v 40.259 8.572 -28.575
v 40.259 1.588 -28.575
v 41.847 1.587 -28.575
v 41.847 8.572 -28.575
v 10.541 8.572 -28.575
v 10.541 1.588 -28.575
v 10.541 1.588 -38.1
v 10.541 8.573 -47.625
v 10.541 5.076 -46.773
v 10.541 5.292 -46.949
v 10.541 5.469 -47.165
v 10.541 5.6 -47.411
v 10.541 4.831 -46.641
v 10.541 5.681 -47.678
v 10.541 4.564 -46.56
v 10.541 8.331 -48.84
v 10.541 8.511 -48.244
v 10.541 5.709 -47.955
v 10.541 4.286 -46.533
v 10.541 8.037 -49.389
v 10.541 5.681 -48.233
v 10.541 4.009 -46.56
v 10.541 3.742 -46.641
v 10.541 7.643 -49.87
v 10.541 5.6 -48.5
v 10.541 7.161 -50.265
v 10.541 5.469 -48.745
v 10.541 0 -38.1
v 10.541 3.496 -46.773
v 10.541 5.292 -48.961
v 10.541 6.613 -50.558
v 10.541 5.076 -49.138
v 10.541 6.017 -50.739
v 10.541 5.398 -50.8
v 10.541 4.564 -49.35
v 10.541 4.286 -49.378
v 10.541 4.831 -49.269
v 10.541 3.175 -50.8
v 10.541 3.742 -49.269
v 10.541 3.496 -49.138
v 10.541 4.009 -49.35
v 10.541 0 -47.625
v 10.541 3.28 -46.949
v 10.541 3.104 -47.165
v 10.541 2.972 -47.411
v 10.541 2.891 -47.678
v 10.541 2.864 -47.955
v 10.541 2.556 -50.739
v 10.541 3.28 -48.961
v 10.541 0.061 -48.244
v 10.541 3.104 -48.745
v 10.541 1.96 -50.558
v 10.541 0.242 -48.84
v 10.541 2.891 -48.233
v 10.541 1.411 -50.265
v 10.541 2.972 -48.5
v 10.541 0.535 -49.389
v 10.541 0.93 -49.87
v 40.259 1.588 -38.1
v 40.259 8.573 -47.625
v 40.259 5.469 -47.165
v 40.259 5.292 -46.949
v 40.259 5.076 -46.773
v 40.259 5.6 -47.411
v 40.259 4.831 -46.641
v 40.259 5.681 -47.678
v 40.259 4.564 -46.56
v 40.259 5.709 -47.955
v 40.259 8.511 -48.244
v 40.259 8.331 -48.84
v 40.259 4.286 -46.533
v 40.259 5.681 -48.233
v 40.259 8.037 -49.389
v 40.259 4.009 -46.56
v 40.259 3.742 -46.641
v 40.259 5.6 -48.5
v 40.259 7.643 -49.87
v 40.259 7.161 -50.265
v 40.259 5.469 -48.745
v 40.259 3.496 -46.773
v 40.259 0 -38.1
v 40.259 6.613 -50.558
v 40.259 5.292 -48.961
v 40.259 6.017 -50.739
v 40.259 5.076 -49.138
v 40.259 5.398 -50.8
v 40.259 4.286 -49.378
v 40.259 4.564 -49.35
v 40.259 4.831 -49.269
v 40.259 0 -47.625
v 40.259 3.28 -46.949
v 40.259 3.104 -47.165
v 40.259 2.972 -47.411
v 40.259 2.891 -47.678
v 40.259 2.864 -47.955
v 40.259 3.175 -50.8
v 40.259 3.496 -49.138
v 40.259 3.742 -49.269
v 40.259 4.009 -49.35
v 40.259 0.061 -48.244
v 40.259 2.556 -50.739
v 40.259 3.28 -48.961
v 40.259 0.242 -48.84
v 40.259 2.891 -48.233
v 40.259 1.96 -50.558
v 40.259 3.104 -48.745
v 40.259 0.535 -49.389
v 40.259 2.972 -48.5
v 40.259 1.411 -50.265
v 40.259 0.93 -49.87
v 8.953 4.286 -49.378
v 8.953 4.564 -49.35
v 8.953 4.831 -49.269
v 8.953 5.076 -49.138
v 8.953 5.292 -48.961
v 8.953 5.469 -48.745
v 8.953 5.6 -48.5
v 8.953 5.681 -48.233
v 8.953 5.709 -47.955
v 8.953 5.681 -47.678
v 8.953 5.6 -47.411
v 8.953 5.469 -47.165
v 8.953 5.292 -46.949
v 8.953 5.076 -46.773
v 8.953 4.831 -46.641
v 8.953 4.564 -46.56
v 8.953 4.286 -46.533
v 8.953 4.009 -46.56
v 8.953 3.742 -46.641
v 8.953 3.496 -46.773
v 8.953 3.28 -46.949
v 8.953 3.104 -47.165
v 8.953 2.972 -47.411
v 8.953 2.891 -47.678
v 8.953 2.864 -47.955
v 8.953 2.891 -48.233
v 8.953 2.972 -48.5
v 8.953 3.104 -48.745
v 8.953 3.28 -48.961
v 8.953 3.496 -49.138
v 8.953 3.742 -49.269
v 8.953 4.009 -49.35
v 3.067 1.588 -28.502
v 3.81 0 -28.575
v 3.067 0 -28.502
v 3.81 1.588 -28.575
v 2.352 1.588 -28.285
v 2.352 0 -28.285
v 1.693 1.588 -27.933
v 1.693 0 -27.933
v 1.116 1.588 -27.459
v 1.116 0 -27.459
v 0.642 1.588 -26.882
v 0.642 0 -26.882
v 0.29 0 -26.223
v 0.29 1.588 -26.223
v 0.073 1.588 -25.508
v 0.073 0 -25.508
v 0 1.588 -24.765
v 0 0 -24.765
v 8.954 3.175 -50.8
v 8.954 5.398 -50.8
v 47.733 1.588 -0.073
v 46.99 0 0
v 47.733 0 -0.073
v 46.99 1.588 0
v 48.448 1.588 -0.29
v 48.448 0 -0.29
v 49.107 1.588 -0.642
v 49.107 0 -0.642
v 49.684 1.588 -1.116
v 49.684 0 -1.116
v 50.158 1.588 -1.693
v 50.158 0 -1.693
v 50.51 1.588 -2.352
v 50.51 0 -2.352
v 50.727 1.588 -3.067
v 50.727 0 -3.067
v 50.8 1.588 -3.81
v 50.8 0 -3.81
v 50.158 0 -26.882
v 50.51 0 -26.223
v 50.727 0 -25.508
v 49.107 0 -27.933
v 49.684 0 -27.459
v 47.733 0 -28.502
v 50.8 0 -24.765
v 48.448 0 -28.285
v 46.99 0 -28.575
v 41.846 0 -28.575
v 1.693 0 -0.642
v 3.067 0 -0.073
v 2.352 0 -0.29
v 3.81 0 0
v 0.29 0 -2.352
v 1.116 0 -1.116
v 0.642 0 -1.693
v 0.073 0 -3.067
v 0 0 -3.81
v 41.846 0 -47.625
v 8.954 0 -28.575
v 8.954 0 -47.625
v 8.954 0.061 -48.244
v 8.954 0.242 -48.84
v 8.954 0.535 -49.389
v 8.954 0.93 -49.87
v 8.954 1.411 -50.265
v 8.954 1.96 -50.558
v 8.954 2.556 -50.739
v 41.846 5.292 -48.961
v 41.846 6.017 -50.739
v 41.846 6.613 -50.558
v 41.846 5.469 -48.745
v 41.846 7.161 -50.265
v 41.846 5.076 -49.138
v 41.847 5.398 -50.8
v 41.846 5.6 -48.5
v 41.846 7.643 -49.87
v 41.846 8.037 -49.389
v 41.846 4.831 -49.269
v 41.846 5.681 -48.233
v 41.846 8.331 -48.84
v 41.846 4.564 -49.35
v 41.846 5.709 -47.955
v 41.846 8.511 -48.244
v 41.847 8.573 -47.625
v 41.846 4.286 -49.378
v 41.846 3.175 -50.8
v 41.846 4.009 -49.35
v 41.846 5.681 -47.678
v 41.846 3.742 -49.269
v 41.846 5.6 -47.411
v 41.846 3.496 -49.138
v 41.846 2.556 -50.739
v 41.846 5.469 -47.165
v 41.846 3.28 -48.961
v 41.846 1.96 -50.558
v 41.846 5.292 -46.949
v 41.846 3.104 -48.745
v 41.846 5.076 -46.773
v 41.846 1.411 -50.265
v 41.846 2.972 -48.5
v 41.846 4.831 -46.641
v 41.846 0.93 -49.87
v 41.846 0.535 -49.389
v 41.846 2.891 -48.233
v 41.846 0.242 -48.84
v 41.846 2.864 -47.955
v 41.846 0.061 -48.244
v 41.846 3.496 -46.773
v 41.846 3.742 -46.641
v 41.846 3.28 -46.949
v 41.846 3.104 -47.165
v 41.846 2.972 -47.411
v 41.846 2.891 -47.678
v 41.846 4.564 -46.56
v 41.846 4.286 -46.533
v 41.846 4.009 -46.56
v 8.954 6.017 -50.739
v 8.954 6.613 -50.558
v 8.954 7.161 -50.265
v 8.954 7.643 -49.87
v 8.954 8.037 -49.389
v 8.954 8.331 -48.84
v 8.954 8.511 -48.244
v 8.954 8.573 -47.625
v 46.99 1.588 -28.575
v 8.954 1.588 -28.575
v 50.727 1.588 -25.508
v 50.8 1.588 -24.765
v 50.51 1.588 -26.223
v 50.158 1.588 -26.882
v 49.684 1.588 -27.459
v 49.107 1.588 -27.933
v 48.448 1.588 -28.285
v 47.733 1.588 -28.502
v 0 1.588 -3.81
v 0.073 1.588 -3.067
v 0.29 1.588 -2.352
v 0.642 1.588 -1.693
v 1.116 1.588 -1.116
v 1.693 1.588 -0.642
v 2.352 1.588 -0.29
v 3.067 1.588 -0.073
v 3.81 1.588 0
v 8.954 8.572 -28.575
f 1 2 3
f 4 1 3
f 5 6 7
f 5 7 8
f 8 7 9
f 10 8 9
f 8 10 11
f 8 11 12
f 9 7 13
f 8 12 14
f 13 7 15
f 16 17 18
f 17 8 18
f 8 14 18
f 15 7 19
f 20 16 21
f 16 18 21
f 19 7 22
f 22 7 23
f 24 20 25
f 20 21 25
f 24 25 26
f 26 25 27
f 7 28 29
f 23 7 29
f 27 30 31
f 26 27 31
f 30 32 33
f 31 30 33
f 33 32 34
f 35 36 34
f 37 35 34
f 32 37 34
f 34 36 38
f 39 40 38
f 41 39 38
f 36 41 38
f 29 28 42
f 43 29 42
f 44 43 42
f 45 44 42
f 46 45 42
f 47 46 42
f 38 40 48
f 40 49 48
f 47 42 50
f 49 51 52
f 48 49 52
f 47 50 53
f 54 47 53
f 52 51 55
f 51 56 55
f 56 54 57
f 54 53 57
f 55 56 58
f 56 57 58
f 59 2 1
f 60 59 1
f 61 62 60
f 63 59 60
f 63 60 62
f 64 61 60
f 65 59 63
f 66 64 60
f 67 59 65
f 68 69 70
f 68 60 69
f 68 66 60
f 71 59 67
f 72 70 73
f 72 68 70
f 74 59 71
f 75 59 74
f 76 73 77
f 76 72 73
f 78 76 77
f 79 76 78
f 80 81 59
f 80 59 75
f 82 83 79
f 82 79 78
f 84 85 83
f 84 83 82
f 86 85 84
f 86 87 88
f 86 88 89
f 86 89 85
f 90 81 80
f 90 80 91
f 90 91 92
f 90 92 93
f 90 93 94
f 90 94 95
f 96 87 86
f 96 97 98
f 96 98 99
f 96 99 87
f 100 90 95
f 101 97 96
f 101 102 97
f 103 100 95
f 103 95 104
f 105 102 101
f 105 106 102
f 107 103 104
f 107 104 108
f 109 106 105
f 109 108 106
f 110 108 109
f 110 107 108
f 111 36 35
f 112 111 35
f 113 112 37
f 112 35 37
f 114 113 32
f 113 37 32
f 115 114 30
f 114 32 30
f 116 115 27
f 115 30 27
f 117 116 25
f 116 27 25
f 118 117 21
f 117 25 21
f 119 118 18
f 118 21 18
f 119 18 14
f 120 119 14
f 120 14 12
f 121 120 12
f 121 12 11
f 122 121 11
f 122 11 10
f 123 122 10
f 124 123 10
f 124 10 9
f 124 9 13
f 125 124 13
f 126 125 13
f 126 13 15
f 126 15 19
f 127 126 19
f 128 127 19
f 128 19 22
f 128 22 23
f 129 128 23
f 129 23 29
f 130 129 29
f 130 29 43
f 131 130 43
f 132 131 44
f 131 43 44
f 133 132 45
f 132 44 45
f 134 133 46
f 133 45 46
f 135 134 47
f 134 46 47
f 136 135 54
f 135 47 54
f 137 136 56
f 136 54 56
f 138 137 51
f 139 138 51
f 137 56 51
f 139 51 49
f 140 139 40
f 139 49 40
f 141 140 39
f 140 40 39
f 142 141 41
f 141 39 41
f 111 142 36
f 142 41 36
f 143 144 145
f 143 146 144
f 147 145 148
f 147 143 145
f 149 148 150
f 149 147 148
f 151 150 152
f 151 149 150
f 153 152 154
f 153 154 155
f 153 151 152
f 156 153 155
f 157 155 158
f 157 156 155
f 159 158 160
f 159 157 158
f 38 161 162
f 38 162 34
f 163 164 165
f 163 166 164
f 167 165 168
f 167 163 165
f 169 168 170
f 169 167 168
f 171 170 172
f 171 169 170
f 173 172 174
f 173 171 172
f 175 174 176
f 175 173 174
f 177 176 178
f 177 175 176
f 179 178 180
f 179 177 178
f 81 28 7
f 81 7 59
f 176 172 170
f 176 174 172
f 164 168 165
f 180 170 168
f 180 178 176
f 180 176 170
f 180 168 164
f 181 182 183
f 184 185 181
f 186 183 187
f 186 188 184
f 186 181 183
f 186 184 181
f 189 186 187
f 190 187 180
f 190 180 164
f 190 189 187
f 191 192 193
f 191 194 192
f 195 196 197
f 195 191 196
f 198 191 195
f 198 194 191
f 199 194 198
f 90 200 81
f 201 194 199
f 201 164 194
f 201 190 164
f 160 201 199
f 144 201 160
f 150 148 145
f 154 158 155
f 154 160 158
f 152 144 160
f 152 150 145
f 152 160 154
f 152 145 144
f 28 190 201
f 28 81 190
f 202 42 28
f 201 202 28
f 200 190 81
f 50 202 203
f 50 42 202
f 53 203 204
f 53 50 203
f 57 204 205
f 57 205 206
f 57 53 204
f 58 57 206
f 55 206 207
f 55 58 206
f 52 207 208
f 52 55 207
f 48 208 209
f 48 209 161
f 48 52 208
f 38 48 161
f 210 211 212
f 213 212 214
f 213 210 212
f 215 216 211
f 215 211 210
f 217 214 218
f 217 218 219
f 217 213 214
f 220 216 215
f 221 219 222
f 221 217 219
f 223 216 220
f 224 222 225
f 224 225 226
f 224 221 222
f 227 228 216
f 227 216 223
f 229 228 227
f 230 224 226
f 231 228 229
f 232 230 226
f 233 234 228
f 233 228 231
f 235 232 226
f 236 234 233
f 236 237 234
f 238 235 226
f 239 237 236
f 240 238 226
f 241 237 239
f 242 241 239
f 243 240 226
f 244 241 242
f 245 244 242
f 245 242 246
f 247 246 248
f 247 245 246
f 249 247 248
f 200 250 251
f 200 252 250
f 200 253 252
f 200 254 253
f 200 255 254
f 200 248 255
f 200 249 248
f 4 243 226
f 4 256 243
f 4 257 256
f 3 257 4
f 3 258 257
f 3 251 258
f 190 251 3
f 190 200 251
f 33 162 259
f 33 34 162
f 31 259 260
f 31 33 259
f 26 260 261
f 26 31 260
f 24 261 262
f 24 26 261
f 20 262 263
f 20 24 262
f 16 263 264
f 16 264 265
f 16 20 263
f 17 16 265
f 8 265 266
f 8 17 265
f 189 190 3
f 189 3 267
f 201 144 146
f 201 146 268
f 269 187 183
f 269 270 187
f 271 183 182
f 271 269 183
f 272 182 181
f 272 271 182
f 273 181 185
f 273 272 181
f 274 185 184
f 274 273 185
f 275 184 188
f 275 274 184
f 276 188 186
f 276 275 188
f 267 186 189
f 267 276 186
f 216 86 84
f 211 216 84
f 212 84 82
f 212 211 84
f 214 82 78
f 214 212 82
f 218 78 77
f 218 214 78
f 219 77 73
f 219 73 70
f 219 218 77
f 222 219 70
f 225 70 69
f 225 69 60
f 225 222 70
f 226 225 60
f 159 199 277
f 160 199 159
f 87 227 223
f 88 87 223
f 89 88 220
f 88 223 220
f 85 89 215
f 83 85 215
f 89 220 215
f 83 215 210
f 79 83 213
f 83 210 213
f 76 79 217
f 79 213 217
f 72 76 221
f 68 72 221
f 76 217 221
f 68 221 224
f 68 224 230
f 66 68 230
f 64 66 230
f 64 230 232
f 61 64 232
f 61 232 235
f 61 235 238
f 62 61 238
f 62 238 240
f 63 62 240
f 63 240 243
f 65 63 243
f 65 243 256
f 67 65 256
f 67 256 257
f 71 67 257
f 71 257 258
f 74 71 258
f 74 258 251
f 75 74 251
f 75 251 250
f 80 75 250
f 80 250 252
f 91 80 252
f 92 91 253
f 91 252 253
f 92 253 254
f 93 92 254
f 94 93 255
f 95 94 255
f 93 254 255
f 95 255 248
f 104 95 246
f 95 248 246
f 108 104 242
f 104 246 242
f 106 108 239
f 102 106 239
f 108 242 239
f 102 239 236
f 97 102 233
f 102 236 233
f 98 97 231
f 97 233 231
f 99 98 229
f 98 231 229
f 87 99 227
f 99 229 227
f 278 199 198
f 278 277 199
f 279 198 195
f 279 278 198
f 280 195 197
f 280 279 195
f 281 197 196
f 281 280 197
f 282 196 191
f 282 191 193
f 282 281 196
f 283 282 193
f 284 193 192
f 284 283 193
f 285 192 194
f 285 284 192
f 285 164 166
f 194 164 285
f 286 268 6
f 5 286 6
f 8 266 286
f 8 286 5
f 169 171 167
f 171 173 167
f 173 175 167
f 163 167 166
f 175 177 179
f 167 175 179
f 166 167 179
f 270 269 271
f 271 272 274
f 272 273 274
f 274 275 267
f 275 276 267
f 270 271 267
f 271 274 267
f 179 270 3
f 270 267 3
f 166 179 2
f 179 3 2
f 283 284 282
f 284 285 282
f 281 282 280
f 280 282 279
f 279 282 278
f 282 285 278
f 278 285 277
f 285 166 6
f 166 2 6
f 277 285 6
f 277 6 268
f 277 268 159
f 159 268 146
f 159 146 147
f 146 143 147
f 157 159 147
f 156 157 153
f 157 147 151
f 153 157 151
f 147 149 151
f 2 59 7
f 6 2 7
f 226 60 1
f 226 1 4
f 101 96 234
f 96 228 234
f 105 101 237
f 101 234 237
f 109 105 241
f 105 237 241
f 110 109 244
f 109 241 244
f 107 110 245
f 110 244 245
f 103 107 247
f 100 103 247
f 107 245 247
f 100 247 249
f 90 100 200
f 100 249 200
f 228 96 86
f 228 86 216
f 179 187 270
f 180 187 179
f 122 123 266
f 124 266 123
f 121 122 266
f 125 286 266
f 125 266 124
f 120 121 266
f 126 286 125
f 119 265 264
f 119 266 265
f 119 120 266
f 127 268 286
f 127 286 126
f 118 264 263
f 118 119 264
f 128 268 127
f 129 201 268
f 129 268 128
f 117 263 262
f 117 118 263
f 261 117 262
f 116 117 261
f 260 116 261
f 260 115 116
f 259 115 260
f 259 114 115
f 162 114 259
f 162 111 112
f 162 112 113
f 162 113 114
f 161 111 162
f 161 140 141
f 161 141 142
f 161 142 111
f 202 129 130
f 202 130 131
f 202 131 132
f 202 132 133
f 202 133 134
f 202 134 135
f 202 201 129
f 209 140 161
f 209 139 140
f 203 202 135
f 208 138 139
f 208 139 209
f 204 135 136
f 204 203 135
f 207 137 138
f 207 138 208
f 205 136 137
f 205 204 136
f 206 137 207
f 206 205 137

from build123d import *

# Parameters (mm, degrees)
BOSS_EXTRUDE1_DEPTH = 1.5875
SKETCH2_W           = 1.5875
SKETCH2_H           = 22.225
BOSS_EXTRUDE2_DEPTH = 6.985
FILLET1_R           = 3.175
FILLET2_R           = 3.81
HOLE1_D             = 2.8448


with BuildPart() as part:
    # Sketch1 → Boss-Extrude1 (new body)
    with BuildSketch(Plane(origin=(0, 0, 0), x_dir=(1, 0, 0), z_dir=(0, 1, 0))):
        Polygon((8.9535, 28.575), (8.9535, 50.8), (10.541, 50.8), (10.541, 38.1), (40.259, 38.1), (40.259, 50.8), (41.8465, 50.8), (41.8465, 28.575), (50.8, 28.575), (50.8, 0), (0, 0), (0, 28.575), align=None)
    extrude(amount=BOSS_EXTRUDE1_DEPTH)

    # Sketch2 → Boss-Extrude2 (add)
    with BuildSketch(Plane(origin=(0, 1.5875, 0), x_dir=(1, 0, 0), z_dir=(0, 1, 0))):
        with Locations((9.74725, 39.6875)):
            Rectangle(SKETCH2_W, SKETCH2_H)
        with Locations((41.05275, 39.6875)):
            Rectangle(SKETCH2_W, SKETCH2_H)
    extrude(amount=BOSS_EXTRUDE2_DEPTH)

    # Fillet1
    fillet1_edges = [part.edges().sort_by_distance(p)[0] for p in [
        (9.74725, 0, -50.8),
        (41.05275, 0, -50.8),
        (9.74725, 8.5725, -50.8),
        (41.05275, 8.5725, -50.8),
    ]]
    fillet(fillet1_edges, radius=FILLET1_R)

    # Fillet2
    fillet2_edges = [part.edges().sort_by_distance(p)[0] for p in [
        (0, 0.79375, -28.575),
        (50.8, 0.79375, -28.575),
        (50.8, 0.79375, 0),
        (0, 0.79375, 0),
    ]]
    fillet(fillet2_edges, radius=FILLET2_R)

    # Hole1 (through all)
    with Locations(Plane.ZY.offset(-8.9535)):
        with Locations((-47.9552, 4.28625)):
            Hole(HOLE1_D / 2)


solid = part.part
